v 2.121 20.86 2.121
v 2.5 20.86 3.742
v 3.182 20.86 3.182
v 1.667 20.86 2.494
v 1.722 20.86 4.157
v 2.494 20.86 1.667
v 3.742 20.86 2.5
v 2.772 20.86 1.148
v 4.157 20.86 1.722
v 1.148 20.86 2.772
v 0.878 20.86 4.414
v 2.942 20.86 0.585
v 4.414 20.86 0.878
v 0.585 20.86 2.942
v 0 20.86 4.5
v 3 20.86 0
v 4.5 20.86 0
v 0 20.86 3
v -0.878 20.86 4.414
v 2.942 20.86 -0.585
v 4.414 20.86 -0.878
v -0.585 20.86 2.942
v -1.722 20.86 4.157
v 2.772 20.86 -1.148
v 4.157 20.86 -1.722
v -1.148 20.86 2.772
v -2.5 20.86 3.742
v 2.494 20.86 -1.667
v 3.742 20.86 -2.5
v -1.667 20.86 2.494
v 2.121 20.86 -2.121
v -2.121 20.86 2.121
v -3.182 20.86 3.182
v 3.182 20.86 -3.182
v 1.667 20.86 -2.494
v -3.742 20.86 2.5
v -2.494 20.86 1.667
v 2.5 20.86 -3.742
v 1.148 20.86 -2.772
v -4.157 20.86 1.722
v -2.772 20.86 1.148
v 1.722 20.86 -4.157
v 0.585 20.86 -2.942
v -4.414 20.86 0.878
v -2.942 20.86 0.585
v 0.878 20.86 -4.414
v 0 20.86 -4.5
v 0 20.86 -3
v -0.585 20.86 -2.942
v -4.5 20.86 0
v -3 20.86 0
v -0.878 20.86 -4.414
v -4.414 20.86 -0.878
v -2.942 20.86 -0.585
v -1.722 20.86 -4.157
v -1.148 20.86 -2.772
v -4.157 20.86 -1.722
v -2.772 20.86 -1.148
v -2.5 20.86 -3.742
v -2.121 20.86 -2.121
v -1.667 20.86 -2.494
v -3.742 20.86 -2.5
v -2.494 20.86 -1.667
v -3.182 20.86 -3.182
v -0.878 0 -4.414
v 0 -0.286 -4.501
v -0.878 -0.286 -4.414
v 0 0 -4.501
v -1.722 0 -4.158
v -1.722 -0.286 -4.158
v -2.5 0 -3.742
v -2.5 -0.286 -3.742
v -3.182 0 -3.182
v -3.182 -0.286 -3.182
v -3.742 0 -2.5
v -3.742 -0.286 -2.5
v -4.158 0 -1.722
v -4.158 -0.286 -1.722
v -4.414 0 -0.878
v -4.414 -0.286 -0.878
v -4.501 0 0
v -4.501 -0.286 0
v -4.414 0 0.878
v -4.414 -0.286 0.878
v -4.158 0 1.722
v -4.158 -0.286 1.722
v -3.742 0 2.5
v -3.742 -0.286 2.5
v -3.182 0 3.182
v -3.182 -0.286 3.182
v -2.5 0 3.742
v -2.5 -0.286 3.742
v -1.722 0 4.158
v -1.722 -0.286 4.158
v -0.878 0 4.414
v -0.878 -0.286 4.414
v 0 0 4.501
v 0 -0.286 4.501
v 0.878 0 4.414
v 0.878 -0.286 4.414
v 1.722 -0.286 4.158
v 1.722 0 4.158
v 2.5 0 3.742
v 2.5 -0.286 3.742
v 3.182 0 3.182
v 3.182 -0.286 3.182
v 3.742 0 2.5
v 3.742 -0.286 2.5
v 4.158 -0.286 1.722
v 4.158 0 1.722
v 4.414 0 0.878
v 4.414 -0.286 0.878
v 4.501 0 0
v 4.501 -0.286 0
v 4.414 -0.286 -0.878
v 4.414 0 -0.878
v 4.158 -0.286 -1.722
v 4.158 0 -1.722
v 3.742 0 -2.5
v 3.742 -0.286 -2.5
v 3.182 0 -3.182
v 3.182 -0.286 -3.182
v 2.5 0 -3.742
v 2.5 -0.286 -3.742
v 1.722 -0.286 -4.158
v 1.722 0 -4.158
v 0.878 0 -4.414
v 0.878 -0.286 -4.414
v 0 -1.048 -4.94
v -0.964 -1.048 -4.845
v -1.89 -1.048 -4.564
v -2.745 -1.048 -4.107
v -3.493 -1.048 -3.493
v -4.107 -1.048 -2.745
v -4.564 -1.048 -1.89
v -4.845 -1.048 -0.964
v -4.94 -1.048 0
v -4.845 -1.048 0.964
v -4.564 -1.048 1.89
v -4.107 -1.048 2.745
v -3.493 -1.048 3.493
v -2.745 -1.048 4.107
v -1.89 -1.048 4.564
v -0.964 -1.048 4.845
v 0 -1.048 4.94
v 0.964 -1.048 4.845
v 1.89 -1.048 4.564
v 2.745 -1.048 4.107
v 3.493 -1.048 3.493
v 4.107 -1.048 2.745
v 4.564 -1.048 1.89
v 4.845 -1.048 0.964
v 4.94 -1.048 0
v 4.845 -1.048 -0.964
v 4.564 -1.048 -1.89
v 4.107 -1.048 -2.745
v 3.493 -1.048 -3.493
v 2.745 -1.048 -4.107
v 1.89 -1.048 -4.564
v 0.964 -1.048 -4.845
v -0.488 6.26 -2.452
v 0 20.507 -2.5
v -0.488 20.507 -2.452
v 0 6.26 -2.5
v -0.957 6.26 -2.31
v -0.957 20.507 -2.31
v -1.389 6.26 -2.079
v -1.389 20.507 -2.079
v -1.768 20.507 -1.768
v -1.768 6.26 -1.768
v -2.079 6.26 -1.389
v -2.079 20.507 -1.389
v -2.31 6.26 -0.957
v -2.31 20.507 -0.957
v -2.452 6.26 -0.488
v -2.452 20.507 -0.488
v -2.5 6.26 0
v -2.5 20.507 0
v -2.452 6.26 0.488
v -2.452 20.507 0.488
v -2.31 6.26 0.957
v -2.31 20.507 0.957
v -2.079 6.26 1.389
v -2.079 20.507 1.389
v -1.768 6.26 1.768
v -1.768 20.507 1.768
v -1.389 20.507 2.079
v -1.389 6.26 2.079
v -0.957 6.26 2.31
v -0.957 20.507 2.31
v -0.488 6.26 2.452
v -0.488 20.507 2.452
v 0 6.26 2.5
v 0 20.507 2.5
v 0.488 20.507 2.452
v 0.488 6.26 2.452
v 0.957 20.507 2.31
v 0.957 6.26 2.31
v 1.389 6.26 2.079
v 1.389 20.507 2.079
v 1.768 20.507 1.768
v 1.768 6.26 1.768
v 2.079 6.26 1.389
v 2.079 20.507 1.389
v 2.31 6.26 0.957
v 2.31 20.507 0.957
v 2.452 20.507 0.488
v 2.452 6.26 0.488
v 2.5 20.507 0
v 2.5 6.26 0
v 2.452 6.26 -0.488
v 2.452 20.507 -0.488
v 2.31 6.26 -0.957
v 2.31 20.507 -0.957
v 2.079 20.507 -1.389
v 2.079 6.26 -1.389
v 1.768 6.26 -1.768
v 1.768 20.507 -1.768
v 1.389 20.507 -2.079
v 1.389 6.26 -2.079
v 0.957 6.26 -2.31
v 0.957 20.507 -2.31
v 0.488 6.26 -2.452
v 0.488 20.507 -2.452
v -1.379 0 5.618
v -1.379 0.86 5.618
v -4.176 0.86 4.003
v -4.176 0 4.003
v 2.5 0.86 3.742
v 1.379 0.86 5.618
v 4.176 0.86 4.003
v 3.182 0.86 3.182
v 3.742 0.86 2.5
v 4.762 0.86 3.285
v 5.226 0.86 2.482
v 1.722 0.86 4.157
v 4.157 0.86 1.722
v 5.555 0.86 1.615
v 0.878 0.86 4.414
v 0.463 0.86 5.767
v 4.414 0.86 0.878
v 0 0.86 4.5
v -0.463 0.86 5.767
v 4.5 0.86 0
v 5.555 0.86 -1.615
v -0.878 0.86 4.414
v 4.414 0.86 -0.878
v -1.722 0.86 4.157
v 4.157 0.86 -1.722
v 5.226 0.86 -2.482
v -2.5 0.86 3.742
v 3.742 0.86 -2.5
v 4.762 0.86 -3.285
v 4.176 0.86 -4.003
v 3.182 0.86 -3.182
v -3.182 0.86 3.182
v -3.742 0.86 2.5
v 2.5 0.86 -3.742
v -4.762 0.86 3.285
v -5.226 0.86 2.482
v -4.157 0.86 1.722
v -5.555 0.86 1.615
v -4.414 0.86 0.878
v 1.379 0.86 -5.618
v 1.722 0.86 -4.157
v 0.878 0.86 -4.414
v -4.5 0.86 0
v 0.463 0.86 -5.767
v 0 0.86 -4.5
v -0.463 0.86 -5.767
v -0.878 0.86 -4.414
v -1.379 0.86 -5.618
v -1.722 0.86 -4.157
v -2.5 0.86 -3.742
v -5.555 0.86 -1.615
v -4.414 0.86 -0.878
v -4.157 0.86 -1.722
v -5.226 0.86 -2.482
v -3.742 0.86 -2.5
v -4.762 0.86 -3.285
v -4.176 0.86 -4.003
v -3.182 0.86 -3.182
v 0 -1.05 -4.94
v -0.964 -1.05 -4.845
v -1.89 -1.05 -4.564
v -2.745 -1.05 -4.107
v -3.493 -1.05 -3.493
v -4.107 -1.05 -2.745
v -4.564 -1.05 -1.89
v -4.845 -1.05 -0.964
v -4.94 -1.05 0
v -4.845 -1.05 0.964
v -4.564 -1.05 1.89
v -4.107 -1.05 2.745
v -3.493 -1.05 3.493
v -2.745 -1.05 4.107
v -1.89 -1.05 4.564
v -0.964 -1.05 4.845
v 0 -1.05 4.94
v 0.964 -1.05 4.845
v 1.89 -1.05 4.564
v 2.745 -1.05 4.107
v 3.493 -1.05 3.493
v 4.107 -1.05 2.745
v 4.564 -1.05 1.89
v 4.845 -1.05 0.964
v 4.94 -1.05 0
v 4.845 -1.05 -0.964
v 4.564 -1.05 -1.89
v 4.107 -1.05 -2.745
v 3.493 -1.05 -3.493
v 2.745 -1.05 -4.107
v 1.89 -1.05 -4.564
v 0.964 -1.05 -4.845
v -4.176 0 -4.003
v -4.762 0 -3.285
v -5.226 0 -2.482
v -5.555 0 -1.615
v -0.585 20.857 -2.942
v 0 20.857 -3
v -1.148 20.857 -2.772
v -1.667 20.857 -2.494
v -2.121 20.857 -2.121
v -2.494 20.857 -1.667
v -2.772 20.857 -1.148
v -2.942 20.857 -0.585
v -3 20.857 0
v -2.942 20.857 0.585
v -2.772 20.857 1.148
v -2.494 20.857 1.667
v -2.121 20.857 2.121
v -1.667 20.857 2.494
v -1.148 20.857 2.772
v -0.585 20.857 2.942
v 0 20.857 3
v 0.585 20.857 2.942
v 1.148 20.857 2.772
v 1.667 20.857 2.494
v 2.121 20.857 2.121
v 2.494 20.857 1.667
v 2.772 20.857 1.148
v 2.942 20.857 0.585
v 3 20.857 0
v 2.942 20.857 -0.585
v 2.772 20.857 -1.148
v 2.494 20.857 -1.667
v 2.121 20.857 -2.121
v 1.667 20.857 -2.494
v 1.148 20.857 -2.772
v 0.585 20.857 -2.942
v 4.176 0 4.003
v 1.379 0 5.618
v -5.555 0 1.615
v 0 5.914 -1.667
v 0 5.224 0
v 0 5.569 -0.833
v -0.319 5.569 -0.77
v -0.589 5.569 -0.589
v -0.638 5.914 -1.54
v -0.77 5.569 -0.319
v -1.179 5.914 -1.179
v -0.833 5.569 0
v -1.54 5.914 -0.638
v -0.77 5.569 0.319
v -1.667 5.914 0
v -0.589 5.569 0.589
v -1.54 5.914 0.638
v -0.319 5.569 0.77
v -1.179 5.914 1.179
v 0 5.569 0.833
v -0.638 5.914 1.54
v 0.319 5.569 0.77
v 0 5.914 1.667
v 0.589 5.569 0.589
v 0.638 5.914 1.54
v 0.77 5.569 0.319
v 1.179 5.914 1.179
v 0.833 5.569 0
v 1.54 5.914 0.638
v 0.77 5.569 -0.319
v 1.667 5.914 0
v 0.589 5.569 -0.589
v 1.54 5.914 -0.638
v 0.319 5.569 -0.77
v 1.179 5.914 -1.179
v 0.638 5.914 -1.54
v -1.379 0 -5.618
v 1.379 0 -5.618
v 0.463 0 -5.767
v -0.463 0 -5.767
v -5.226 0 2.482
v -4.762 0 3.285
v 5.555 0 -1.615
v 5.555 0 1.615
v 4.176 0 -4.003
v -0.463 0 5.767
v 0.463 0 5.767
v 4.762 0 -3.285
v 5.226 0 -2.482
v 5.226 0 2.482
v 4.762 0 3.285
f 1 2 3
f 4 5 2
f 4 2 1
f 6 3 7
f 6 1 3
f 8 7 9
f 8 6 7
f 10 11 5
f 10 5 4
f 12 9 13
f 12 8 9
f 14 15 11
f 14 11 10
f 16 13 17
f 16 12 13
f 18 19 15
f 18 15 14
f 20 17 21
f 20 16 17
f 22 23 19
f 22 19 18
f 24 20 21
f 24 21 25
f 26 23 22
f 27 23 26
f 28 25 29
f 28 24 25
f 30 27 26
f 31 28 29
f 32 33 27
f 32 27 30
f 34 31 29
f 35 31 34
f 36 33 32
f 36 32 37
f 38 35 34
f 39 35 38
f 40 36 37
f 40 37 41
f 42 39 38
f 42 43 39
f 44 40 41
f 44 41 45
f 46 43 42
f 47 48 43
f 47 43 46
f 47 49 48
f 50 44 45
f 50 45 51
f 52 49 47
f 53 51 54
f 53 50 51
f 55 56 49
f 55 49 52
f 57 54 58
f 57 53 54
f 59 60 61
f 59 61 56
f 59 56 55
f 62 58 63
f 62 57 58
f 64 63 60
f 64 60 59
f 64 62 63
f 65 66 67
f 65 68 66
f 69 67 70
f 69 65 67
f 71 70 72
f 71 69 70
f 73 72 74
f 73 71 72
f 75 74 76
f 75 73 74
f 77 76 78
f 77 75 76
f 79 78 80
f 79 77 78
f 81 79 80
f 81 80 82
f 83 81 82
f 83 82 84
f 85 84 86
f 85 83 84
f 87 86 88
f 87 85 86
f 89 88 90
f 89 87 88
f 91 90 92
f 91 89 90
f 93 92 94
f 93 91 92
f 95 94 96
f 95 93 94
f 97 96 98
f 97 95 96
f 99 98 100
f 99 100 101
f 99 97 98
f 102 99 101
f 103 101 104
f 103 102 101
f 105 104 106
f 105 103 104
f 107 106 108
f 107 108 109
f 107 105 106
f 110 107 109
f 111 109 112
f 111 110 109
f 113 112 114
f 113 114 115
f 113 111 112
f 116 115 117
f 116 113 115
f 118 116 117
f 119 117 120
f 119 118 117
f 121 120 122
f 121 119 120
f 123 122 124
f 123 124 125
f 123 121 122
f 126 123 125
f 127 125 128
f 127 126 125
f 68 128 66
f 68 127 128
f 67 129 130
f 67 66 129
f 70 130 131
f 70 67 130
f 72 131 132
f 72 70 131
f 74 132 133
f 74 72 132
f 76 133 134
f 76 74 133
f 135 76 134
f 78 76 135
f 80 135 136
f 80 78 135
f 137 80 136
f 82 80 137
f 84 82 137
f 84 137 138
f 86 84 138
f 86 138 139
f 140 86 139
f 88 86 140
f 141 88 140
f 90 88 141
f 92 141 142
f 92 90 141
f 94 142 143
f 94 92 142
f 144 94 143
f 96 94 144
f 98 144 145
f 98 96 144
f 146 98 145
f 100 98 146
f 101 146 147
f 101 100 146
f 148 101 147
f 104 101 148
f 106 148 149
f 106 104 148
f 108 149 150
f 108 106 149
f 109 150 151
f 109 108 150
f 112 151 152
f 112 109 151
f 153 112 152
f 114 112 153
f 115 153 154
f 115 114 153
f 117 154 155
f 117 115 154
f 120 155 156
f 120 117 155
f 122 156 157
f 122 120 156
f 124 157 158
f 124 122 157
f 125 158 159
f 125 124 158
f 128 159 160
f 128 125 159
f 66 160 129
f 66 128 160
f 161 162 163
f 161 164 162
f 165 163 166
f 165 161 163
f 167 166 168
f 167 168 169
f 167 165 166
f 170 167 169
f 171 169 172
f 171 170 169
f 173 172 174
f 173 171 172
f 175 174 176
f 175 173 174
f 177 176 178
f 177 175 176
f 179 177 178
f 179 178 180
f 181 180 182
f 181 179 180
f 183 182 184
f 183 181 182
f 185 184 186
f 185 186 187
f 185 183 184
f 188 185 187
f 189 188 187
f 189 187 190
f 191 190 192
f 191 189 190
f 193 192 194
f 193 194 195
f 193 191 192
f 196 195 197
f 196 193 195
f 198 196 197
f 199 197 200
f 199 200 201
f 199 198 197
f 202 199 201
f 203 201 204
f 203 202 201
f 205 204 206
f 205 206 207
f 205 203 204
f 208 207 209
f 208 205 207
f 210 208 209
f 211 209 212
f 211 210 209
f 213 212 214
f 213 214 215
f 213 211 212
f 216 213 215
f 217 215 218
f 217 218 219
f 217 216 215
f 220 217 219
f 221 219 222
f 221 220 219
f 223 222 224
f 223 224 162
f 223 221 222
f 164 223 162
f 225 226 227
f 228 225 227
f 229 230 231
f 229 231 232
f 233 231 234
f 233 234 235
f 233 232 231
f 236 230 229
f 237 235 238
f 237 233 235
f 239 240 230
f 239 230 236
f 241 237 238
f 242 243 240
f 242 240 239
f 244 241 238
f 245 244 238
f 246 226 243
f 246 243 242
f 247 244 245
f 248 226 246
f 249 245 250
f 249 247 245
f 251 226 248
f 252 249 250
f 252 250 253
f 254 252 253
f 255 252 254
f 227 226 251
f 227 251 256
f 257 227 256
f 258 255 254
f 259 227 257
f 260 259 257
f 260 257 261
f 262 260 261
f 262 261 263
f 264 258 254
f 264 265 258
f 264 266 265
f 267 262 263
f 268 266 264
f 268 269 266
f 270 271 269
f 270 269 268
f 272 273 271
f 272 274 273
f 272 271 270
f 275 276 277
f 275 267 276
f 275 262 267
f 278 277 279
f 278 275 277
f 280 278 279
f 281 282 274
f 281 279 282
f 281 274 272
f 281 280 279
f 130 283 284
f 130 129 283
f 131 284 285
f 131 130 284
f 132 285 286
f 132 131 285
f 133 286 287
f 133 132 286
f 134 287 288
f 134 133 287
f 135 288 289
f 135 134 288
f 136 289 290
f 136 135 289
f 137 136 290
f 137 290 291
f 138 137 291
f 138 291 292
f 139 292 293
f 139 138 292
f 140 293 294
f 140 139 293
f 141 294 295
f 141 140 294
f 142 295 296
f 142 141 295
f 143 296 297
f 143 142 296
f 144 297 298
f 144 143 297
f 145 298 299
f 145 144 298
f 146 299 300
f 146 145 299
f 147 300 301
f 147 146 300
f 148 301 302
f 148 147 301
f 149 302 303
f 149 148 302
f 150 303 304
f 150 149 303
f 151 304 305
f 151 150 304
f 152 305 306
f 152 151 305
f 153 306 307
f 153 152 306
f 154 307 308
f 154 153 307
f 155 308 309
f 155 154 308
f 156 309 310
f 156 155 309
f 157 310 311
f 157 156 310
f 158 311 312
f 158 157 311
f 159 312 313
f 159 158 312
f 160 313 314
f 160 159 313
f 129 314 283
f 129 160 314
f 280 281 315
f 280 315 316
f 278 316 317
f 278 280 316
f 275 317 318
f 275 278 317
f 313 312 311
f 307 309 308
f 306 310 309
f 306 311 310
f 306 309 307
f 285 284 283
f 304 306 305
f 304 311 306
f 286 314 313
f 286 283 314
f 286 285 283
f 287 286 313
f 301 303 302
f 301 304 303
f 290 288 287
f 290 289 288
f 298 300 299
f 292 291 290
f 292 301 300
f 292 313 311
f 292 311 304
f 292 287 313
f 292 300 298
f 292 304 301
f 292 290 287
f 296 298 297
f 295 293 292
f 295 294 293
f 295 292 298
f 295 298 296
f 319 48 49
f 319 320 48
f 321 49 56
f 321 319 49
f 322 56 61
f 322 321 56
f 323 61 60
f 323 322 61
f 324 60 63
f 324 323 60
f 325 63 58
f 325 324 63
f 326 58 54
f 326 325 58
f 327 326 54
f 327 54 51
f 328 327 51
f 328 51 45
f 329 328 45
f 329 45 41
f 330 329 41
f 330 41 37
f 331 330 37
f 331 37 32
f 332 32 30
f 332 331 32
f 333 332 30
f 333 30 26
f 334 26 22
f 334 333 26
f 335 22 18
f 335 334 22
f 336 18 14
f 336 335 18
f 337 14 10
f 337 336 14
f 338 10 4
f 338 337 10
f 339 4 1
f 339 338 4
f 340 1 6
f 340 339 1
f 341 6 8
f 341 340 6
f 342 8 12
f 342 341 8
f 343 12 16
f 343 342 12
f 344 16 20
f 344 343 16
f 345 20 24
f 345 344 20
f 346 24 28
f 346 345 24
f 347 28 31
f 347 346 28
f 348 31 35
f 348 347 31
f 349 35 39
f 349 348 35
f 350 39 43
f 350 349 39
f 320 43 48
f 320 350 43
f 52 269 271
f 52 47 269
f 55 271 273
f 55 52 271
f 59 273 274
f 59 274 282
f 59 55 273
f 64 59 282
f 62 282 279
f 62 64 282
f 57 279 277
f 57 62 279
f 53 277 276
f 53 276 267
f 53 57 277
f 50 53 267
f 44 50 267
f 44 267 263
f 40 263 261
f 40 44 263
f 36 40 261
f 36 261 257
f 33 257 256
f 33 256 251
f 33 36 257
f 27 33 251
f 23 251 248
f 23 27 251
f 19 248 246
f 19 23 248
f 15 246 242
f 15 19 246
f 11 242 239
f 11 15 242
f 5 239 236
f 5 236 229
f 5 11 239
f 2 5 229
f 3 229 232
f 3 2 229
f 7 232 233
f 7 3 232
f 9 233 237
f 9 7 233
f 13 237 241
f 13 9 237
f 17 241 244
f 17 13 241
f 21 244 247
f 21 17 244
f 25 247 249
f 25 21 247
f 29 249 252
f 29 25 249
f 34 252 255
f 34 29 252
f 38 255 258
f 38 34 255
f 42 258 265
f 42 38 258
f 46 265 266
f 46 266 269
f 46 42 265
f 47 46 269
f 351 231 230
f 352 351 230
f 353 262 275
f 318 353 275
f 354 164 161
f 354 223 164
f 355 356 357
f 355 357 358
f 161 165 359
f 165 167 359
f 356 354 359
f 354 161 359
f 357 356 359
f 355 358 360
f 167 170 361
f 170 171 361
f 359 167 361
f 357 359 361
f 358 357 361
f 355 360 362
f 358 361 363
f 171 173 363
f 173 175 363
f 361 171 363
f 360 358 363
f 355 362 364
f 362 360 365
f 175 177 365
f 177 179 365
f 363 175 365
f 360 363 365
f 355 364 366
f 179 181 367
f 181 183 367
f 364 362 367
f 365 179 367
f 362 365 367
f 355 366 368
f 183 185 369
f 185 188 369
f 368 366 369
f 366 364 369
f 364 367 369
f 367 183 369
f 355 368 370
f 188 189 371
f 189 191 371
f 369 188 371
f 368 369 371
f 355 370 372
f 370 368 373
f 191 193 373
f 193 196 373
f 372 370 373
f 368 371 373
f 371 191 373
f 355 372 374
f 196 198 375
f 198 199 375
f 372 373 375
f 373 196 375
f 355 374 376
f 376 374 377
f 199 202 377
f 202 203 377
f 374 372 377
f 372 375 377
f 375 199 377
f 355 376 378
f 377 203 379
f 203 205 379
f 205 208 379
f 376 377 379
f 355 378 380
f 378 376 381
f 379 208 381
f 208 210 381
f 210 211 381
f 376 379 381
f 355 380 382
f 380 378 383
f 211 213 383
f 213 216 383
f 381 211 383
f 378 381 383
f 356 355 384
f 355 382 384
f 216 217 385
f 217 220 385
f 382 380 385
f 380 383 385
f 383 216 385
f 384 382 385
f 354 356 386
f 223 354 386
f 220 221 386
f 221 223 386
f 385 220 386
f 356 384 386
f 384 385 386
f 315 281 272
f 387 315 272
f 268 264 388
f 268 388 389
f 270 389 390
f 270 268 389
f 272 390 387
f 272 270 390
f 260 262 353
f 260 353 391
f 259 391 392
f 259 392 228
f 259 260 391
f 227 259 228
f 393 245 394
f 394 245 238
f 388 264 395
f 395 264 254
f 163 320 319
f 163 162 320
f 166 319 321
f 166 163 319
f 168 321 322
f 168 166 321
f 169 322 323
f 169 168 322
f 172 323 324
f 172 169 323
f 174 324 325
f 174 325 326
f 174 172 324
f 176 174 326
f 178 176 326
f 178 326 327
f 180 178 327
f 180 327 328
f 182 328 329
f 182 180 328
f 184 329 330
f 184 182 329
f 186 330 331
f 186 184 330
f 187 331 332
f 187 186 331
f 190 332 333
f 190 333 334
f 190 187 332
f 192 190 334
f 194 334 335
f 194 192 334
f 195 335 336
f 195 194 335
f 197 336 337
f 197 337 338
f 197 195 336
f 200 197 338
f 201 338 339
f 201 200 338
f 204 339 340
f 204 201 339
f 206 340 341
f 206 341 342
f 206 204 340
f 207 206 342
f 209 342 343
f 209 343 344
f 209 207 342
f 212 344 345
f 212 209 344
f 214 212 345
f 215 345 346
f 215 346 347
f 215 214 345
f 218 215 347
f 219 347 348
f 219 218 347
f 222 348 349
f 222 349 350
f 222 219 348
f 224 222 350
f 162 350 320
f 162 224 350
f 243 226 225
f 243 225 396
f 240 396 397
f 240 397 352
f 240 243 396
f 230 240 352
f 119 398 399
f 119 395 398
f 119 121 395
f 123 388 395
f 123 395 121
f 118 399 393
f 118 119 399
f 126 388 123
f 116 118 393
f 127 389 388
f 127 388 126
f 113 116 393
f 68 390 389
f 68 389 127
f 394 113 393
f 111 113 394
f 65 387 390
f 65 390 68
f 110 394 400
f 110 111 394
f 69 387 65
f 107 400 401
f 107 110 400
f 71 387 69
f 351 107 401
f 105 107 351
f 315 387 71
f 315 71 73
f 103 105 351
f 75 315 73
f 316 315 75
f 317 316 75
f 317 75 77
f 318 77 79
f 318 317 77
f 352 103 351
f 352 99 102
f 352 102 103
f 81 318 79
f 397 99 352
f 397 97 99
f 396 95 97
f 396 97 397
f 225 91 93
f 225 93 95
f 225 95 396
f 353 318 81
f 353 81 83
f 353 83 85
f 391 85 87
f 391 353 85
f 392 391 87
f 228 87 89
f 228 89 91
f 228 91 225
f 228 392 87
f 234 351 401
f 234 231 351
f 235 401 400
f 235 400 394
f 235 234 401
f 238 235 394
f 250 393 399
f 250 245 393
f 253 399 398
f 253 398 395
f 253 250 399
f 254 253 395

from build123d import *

# Parameters (mm, degrees)
HEXDIESKE_R  = 6.4443
HEXDIE_DEPTH = 0.8595


with BuildPart() as part:
    # BodySke → Body (revolve)
    with BuildSketch(Plane.XY, mode=Mode.PRIVATE) as body_sk:
        Polygon((4.500636445, 0), (5.785104, 0), (5.785104, 0.8595), (4.5, 0.8595), (4.5, 20.8595), (2.5, 20.8595), (2.5, 11.2595), (0, 11.2595), (0, -1.0505), (4.94, -1.0505), (4.94, -1.0475), (4.500636445, -0.2865), align=None)
    revolve(body_sk.sketch.rotate(Axis((0, 0, 0), (0, 1, 0)), 90), axis=Axis((0, 0, 0), (0, 1, 0)))

    # TapDriSke → TapDrill (revolve, cut)
    with BuildSketch(Plane.XY, mode=Mode.PRIVATE) as tapdrill_sk:
        Polygon((2.5, 6.2595), (2.5, 20.8595), (0, 20.8595), (0, 5.223966094), align=None)
    revolve(tapdrill_sk.sketch.rotate(Axis((0, 0, 0), (0, 1, 0)), 90), axis=Axis((0, 0, 0), (0, 1, 0)), mode=Mode.SUBTRACT)

    # EndChamferSke → EndChamfer (revolve, cut)
    with BuildSketch(Plane.XY, mode=Mode.PRIVATE) as endchamfer_sk:
        Polygon((3, 20.85696), (2.5, 20.506986267), (2.5, 21.1135), (3, 21.1135), align=None)
    revolve(endchamfer_sk.sketch.rotate(Axis((0, -2.54, 0), (0, 1, 0)), 90), axis=Axis((0, -2.54, 0), (0, 1, 0)), mode=Mode.SUBTRACT)

    # HexDieSke → HexDie (cut)
    with BuildSketch(Plane(origin=(0, 0.8595, 0), x_dir=(-1, 0, 0), z_dir=(0, 1, 0))):
        Circle(HEXDIESKE_R)
        Polygon((0, 6.414361491), (5.555, 3.207180745), (5.555, -3.207180745), (0, -6.414361491), (-5.555, -3.207180745), (-5.555, 3.207180745), align=None, mode=Mode.SUBTRACT)
    extrude(amount=-HEXDIE_DEPTH, mode=Mode.SUBTRACT)


solid = part.part
